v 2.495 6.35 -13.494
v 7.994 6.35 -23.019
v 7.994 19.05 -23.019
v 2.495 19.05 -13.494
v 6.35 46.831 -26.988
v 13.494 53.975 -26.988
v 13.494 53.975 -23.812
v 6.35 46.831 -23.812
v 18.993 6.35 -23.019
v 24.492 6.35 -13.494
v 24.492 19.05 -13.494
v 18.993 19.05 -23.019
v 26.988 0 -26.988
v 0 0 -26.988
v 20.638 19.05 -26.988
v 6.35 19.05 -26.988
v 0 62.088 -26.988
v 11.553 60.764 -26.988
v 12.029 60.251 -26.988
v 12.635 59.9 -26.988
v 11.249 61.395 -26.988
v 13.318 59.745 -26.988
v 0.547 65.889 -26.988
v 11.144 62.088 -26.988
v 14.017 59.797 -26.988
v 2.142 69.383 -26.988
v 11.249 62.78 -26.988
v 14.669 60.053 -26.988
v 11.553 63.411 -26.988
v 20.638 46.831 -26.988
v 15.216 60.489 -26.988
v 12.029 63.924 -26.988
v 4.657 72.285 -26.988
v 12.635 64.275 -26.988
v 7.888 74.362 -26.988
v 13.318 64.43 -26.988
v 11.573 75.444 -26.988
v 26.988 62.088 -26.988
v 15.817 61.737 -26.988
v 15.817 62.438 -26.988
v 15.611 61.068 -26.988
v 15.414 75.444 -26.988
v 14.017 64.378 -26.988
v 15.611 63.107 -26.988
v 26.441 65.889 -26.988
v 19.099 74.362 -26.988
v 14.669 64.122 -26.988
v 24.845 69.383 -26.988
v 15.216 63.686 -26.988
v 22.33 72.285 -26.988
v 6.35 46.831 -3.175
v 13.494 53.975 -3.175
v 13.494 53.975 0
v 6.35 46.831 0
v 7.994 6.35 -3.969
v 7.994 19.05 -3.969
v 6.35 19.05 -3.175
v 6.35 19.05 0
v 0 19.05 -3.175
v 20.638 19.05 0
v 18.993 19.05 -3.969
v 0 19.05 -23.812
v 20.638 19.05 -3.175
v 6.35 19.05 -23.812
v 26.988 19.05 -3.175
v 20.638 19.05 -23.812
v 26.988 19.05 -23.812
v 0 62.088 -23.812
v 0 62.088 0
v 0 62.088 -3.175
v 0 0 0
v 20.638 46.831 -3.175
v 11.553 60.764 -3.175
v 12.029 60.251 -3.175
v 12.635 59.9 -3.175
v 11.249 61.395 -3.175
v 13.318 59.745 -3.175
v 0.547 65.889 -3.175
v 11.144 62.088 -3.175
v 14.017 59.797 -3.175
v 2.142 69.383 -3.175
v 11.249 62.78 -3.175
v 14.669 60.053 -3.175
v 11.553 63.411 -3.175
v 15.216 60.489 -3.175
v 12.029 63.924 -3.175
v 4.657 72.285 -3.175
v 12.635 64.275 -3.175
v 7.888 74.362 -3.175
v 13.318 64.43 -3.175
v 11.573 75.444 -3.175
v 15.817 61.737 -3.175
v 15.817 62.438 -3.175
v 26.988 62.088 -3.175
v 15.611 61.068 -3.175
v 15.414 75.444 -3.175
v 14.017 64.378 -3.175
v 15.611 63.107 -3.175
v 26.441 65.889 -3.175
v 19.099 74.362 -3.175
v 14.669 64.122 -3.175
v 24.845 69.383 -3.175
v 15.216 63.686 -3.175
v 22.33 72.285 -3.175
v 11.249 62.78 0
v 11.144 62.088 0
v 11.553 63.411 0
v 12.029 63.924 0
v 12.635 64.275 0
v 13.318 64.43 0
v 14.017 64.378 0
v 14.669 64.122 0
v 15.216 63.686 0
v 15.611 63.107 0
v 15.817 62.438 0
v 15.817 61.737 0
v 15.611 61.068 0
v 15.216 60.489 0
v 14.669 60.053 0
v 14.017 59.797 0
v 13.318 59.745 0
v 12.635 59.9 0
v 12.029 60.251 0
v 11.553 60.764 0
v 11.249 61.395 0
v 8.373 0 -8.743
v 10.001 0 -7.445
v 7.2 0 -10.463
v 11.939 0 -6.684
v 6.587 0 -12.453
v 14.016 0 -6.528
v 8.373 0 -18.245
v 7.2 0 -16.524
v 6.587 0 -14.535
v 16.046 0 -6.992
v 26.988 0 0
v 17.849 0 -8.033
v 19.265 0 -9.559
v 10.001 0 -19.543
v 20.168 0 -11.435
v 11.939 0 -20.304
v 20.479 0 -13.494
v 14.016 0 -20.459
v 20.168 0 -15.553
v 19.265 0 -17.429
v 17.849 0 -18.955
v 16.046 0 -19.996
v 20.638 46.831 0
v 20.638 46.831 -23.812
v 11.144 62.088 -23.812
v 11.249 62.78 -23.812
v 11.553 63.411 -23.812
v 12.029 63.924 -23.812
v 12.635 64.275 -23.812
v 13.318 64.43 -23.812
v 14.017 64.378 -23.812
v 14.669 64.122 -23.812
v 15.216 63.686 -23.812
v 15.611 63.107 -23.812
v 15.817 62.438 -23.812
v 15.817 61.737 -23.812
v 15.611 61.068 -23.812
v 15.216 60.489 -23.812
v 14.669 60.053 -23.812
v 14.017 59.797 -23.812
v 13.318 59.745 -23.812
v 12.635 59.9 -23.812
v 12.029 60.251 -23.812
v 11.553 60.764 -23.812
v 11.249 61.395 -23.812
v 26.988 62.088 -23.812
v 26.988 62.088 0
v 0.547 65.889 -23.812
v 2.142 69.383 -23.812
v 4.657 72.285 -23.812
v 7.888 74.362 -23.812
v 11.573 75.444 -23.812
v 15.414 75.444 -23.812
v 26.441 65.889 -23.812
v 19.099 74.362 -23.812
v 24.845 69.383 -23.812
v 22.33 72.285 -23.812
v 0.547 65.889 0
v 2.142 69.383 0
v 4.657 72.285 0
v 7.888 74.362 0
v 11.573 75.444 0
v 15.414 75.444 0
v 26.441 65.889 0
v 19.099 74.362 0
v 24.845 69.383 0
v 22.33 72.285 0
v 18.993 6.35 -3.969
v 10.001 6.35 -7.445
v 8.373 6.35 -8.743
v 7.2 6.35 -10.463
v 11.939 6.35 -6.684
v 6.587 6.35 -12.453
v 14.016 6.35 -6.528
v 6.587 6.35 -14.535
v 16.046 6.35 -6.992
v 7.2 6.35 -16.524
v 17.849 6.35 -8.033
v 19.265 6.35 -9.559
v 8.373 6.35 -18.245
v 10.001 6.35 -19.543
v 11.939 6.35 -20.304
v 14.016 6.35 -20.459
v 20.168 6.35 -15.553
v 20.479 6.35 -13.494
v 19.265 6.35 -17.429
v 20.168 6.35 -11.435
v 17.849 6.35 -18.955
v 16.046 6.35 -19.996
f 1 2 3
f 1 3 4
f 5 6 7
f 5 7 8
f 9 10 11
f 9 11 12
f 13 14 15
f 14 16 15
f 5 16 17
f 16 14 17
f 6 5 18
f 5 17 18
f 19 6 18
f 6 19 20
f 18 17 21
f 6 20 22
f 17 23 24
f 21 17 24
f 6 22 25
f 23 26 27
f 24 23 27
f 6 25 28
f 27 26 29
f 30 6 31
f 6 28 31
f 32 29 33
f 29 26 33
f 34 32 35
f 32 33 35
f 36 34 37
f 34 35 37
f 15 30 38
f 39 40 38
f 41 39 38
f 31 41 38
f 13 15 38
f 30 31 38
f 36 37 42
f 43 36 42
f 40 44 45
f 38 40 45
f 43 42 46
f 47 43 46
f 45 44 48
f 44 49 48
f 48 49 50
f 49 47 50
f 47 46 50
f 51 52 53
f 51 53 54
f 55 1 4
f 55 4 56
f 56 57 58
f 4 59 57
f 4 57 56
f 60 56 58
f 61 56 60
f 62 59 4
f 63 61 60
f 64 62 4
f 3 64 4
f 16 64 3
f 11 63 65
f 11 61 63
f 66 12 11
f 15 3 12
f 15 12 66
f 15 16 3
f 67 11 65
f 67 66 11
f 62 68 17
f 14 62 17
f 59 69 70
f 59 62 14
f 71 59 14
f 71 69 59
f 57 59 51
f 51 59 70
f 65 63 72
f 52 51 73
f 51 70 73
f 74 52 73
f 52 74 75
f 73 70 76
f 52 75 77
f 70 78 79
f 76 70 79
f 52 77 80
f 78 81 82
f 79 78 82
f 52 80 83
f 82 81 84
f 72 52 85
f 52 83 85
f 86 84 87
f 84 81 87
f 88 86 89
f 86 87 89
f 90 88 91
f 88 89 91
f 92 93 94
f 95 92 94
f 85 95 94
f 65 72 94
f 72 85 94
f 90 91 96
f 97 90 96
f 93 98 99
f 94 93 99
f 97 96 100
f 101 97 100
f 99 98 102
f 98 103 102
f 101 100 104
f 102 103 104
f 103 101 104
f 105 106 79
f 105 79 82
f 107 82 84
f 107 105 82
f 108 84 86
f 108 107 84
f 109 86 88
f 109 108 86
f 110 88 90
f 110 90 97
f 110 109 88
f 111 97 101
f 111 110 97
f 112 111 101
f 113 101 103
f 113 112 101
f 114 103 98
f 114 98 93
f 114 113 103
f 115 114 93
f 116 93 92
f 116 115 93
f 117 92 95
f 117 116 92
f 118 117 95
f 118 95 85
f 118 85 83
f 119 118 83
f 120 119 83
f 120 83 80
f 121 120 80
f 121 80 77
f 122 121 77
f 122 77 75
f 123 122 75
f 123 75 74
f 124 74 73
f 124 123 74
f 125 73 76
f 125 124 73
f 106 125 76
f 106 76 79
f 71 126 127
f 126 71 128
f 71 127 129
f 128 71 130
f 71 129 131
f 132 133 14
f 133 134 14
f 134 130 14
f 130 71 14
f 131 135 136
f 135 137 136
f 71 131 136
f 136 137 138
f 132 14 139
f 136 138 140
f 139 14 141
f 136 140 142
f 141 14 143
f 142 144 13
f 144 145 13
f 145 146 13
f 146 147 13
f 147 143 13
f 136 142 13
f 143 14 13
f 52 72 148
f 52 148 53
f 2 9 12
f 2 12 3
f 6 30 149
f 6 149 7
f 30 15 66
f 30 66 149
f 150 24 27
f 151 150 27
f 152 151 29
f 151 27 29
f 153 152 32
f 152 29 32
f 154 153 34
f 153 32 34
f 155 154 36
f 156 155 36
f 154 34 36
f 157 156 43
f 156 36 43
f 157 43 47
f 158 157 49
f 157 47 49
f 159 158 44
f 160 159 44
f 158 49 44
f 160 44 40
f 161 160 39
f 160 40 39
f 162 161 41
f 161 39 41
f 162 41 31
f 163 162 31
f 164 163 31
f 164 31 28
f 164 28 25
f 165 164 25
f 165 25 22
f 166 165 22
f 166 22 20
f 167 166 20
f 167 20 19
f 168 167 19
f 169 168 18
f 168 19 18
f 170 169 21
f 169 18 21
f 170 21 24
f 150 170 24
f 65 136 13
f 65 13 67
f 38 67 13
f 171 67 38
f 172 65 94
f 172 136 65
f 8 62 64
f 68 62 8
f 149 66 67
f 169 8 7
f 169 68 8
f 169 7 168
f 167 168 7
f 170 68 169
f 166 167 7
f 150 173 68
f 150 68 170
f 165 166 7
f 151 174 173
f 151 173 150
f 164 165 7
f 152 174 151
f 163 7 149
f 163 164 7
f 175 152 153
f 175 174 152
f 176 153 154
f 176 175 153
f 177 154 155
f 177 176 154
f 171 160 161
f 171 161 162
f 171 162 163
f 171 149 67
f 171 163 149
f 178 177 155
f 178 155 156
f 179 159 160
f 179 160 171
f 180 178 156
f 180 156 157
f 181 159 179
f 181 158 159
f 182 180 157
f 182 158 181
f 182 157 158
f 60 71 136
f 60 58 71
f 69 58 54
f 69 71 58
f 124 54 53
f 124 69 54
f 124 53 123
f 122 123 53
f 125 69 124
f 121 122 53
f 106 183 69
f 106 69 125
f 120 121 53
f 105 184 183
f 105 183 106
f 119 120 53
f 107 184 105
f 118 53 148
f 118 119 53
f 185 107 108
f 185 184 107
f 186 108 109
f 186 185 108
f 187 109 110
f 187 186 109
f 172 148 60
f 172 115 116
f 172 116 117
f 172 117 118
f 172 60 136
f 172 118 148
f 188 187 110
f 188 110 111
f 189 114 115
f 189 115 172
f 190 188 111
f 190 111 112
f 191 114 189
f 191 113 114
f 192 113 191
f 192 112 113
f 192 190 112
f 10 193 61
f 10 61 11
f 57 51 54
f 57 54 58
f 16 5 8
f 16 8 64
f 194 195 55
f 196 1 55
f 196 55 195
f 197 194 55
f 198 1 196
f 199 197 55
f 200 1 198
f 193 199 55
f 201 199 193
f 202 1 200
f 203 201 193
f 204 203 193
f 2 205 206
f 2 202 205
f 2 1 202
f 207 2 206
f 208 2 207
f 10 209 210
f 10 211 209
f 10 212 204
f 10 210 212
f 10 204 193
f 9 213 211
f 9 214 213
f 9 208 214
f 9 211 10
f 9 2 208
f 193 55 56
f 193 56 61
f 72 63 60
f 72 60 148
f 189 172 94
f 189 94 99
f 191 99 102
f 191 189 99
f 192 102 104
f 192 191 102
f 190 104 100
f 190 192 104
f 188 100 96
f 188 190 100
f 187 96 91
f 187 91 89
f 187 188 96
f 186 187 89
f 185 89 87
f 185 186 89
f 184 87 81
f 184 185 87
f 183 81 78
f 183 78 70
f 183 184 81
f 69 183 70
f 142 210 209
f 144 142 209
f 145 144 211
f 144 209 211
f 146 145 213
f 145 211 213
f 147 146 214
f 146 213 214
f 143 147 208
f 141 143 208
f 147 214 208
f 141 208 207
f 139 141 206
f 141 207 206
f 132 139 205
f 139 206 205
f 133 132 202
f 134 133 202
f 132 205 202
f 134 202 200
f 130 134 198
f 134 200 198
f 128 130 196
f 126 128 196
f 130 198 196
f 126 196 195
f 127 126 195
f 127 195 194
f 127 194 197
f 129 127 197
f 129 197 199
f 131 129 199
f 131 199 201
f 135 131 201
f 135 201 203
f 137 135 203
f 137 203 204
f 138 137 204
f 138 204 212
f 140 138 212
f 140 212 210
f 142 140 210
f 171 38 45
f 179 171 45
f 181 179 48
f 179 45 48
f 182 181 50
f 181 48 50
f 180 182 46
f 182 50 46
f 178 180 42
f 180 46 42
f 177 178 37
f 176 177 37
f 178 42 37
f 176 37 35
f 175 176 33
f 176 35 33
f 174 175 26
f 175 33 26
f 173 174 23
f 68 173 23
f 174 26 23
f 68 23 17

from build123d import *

# Parameters (mm, degrees)
SKETCH1_W           = 26.9875
SKETCH1_H           = 26.9875
BOSS_EXTRUDE1_DEPTH = 19.05
SKETCH2_R           = 6.985
CUT_EXTRUDE1_DEPTH  = 20.05
CUT_EXTRUDE4_DEPTH  = 12.7
SKETCH4_R           = 2.3495
BOSS_EXTRUDE2_DEPTH = 3.175
CUT_EXTRUDE5_DEPTH  = 27.9875


with BuildPart() as part:
    # Sketch1 → Boss-Extrude1 (new body)
    with BuildSketch(Plane(origin=(0, 0, 0), x_dir=(1, 0, 0), z_dir=(0, 1, 0))):
        with Locations((13.49375, 13.49375)):
            Rectangle(SKETCH1_W, SKETCH1_H)
    extrude(amount=BOSS_EXTRUDE1_DEPTH)

    # Sketch2 → Cut-Extrude1 (cut, through all)
    with BuildSketch(Plane(origin=(0, 19.05, 0), x_dir=(1, 0, 0), z_dir=(0, 1, 0))):
        with Locations((13.49375, 13.49375)):
            Circle(SKETCH2_R)
    extrude(amount=-CUT_EXTRUDE1_DEPTH, mode=Mode.SUBTRACT)

    # Sketch3 → Cut-Extrude4 (cut)
    with BuildSketch(Plane(origin=(0, 19.05, 0), x_dir=(1, 0, 0), z_dir=(0, 1, 0))):
        Polygon((18.993011314, 23.01875), (7.994488686, 23.01875), (2.495227372, 13.49375), (7.994488686, 3.96875), (18.993011314, 3.96875), (24.492272628, 13.49375), align=None)
    extrude(amount=-CUT_EXTRUDE4_DEPTH, mode=Mode.SUBTRACT)

    # Sketch4 → Boss-Extrude2 (add)
    with BuildSketch(Plane(origin=(0, 0, -26.9875), x_dir=(-1, 0, 0), z_dir=(0, 0, -1))):
        with BuildLine():
            Line((0, 19.05), (-26.9875, 19.05))
            Line((-26.9875, 19.05), (-26.9875, 62.0875))
            ThreePointArc((-26.9875, 62.0875), (-13.49375, 75.58125), (0, 62.0875))
            Line((0, 62.0875), (0, 19.05))
        make_face()
        with Locations((-13.49375, 62.0875)):
            Circle(SKETCH4_R, mode=Mode.SUBTRACT)
    boss_extrude2 = extrude(amount=-BOSS_EXTRUDE2_DEPTH)

    # Mirror1: Boss-Extrude2 across plane
    add(boss_extrude2.mirror(Plane(origin=(0, 0, -13.49375), x_dir=(1, 0, 0), z_dir=(0, 0, -1))))

    # Sketch6 → Cut-Extrude5 (cut, through all)
    with BuildSketch(Plane(origin=(0, 0, -26.9875), x_dir=(-1, 0, 0), z_dir=(0, 0, -1))):
        Polygon((-20.6375, 46.83125), (-13.49375, 53.975), (-6.35, 46.83125), (-6.35, 19.05), (-20.6375, 19.05), align=None)
    extrude(amount=-CUT_EXTRUDE5_DEPTH, mode=Mode.SUBTRACT)


solid = part.part
